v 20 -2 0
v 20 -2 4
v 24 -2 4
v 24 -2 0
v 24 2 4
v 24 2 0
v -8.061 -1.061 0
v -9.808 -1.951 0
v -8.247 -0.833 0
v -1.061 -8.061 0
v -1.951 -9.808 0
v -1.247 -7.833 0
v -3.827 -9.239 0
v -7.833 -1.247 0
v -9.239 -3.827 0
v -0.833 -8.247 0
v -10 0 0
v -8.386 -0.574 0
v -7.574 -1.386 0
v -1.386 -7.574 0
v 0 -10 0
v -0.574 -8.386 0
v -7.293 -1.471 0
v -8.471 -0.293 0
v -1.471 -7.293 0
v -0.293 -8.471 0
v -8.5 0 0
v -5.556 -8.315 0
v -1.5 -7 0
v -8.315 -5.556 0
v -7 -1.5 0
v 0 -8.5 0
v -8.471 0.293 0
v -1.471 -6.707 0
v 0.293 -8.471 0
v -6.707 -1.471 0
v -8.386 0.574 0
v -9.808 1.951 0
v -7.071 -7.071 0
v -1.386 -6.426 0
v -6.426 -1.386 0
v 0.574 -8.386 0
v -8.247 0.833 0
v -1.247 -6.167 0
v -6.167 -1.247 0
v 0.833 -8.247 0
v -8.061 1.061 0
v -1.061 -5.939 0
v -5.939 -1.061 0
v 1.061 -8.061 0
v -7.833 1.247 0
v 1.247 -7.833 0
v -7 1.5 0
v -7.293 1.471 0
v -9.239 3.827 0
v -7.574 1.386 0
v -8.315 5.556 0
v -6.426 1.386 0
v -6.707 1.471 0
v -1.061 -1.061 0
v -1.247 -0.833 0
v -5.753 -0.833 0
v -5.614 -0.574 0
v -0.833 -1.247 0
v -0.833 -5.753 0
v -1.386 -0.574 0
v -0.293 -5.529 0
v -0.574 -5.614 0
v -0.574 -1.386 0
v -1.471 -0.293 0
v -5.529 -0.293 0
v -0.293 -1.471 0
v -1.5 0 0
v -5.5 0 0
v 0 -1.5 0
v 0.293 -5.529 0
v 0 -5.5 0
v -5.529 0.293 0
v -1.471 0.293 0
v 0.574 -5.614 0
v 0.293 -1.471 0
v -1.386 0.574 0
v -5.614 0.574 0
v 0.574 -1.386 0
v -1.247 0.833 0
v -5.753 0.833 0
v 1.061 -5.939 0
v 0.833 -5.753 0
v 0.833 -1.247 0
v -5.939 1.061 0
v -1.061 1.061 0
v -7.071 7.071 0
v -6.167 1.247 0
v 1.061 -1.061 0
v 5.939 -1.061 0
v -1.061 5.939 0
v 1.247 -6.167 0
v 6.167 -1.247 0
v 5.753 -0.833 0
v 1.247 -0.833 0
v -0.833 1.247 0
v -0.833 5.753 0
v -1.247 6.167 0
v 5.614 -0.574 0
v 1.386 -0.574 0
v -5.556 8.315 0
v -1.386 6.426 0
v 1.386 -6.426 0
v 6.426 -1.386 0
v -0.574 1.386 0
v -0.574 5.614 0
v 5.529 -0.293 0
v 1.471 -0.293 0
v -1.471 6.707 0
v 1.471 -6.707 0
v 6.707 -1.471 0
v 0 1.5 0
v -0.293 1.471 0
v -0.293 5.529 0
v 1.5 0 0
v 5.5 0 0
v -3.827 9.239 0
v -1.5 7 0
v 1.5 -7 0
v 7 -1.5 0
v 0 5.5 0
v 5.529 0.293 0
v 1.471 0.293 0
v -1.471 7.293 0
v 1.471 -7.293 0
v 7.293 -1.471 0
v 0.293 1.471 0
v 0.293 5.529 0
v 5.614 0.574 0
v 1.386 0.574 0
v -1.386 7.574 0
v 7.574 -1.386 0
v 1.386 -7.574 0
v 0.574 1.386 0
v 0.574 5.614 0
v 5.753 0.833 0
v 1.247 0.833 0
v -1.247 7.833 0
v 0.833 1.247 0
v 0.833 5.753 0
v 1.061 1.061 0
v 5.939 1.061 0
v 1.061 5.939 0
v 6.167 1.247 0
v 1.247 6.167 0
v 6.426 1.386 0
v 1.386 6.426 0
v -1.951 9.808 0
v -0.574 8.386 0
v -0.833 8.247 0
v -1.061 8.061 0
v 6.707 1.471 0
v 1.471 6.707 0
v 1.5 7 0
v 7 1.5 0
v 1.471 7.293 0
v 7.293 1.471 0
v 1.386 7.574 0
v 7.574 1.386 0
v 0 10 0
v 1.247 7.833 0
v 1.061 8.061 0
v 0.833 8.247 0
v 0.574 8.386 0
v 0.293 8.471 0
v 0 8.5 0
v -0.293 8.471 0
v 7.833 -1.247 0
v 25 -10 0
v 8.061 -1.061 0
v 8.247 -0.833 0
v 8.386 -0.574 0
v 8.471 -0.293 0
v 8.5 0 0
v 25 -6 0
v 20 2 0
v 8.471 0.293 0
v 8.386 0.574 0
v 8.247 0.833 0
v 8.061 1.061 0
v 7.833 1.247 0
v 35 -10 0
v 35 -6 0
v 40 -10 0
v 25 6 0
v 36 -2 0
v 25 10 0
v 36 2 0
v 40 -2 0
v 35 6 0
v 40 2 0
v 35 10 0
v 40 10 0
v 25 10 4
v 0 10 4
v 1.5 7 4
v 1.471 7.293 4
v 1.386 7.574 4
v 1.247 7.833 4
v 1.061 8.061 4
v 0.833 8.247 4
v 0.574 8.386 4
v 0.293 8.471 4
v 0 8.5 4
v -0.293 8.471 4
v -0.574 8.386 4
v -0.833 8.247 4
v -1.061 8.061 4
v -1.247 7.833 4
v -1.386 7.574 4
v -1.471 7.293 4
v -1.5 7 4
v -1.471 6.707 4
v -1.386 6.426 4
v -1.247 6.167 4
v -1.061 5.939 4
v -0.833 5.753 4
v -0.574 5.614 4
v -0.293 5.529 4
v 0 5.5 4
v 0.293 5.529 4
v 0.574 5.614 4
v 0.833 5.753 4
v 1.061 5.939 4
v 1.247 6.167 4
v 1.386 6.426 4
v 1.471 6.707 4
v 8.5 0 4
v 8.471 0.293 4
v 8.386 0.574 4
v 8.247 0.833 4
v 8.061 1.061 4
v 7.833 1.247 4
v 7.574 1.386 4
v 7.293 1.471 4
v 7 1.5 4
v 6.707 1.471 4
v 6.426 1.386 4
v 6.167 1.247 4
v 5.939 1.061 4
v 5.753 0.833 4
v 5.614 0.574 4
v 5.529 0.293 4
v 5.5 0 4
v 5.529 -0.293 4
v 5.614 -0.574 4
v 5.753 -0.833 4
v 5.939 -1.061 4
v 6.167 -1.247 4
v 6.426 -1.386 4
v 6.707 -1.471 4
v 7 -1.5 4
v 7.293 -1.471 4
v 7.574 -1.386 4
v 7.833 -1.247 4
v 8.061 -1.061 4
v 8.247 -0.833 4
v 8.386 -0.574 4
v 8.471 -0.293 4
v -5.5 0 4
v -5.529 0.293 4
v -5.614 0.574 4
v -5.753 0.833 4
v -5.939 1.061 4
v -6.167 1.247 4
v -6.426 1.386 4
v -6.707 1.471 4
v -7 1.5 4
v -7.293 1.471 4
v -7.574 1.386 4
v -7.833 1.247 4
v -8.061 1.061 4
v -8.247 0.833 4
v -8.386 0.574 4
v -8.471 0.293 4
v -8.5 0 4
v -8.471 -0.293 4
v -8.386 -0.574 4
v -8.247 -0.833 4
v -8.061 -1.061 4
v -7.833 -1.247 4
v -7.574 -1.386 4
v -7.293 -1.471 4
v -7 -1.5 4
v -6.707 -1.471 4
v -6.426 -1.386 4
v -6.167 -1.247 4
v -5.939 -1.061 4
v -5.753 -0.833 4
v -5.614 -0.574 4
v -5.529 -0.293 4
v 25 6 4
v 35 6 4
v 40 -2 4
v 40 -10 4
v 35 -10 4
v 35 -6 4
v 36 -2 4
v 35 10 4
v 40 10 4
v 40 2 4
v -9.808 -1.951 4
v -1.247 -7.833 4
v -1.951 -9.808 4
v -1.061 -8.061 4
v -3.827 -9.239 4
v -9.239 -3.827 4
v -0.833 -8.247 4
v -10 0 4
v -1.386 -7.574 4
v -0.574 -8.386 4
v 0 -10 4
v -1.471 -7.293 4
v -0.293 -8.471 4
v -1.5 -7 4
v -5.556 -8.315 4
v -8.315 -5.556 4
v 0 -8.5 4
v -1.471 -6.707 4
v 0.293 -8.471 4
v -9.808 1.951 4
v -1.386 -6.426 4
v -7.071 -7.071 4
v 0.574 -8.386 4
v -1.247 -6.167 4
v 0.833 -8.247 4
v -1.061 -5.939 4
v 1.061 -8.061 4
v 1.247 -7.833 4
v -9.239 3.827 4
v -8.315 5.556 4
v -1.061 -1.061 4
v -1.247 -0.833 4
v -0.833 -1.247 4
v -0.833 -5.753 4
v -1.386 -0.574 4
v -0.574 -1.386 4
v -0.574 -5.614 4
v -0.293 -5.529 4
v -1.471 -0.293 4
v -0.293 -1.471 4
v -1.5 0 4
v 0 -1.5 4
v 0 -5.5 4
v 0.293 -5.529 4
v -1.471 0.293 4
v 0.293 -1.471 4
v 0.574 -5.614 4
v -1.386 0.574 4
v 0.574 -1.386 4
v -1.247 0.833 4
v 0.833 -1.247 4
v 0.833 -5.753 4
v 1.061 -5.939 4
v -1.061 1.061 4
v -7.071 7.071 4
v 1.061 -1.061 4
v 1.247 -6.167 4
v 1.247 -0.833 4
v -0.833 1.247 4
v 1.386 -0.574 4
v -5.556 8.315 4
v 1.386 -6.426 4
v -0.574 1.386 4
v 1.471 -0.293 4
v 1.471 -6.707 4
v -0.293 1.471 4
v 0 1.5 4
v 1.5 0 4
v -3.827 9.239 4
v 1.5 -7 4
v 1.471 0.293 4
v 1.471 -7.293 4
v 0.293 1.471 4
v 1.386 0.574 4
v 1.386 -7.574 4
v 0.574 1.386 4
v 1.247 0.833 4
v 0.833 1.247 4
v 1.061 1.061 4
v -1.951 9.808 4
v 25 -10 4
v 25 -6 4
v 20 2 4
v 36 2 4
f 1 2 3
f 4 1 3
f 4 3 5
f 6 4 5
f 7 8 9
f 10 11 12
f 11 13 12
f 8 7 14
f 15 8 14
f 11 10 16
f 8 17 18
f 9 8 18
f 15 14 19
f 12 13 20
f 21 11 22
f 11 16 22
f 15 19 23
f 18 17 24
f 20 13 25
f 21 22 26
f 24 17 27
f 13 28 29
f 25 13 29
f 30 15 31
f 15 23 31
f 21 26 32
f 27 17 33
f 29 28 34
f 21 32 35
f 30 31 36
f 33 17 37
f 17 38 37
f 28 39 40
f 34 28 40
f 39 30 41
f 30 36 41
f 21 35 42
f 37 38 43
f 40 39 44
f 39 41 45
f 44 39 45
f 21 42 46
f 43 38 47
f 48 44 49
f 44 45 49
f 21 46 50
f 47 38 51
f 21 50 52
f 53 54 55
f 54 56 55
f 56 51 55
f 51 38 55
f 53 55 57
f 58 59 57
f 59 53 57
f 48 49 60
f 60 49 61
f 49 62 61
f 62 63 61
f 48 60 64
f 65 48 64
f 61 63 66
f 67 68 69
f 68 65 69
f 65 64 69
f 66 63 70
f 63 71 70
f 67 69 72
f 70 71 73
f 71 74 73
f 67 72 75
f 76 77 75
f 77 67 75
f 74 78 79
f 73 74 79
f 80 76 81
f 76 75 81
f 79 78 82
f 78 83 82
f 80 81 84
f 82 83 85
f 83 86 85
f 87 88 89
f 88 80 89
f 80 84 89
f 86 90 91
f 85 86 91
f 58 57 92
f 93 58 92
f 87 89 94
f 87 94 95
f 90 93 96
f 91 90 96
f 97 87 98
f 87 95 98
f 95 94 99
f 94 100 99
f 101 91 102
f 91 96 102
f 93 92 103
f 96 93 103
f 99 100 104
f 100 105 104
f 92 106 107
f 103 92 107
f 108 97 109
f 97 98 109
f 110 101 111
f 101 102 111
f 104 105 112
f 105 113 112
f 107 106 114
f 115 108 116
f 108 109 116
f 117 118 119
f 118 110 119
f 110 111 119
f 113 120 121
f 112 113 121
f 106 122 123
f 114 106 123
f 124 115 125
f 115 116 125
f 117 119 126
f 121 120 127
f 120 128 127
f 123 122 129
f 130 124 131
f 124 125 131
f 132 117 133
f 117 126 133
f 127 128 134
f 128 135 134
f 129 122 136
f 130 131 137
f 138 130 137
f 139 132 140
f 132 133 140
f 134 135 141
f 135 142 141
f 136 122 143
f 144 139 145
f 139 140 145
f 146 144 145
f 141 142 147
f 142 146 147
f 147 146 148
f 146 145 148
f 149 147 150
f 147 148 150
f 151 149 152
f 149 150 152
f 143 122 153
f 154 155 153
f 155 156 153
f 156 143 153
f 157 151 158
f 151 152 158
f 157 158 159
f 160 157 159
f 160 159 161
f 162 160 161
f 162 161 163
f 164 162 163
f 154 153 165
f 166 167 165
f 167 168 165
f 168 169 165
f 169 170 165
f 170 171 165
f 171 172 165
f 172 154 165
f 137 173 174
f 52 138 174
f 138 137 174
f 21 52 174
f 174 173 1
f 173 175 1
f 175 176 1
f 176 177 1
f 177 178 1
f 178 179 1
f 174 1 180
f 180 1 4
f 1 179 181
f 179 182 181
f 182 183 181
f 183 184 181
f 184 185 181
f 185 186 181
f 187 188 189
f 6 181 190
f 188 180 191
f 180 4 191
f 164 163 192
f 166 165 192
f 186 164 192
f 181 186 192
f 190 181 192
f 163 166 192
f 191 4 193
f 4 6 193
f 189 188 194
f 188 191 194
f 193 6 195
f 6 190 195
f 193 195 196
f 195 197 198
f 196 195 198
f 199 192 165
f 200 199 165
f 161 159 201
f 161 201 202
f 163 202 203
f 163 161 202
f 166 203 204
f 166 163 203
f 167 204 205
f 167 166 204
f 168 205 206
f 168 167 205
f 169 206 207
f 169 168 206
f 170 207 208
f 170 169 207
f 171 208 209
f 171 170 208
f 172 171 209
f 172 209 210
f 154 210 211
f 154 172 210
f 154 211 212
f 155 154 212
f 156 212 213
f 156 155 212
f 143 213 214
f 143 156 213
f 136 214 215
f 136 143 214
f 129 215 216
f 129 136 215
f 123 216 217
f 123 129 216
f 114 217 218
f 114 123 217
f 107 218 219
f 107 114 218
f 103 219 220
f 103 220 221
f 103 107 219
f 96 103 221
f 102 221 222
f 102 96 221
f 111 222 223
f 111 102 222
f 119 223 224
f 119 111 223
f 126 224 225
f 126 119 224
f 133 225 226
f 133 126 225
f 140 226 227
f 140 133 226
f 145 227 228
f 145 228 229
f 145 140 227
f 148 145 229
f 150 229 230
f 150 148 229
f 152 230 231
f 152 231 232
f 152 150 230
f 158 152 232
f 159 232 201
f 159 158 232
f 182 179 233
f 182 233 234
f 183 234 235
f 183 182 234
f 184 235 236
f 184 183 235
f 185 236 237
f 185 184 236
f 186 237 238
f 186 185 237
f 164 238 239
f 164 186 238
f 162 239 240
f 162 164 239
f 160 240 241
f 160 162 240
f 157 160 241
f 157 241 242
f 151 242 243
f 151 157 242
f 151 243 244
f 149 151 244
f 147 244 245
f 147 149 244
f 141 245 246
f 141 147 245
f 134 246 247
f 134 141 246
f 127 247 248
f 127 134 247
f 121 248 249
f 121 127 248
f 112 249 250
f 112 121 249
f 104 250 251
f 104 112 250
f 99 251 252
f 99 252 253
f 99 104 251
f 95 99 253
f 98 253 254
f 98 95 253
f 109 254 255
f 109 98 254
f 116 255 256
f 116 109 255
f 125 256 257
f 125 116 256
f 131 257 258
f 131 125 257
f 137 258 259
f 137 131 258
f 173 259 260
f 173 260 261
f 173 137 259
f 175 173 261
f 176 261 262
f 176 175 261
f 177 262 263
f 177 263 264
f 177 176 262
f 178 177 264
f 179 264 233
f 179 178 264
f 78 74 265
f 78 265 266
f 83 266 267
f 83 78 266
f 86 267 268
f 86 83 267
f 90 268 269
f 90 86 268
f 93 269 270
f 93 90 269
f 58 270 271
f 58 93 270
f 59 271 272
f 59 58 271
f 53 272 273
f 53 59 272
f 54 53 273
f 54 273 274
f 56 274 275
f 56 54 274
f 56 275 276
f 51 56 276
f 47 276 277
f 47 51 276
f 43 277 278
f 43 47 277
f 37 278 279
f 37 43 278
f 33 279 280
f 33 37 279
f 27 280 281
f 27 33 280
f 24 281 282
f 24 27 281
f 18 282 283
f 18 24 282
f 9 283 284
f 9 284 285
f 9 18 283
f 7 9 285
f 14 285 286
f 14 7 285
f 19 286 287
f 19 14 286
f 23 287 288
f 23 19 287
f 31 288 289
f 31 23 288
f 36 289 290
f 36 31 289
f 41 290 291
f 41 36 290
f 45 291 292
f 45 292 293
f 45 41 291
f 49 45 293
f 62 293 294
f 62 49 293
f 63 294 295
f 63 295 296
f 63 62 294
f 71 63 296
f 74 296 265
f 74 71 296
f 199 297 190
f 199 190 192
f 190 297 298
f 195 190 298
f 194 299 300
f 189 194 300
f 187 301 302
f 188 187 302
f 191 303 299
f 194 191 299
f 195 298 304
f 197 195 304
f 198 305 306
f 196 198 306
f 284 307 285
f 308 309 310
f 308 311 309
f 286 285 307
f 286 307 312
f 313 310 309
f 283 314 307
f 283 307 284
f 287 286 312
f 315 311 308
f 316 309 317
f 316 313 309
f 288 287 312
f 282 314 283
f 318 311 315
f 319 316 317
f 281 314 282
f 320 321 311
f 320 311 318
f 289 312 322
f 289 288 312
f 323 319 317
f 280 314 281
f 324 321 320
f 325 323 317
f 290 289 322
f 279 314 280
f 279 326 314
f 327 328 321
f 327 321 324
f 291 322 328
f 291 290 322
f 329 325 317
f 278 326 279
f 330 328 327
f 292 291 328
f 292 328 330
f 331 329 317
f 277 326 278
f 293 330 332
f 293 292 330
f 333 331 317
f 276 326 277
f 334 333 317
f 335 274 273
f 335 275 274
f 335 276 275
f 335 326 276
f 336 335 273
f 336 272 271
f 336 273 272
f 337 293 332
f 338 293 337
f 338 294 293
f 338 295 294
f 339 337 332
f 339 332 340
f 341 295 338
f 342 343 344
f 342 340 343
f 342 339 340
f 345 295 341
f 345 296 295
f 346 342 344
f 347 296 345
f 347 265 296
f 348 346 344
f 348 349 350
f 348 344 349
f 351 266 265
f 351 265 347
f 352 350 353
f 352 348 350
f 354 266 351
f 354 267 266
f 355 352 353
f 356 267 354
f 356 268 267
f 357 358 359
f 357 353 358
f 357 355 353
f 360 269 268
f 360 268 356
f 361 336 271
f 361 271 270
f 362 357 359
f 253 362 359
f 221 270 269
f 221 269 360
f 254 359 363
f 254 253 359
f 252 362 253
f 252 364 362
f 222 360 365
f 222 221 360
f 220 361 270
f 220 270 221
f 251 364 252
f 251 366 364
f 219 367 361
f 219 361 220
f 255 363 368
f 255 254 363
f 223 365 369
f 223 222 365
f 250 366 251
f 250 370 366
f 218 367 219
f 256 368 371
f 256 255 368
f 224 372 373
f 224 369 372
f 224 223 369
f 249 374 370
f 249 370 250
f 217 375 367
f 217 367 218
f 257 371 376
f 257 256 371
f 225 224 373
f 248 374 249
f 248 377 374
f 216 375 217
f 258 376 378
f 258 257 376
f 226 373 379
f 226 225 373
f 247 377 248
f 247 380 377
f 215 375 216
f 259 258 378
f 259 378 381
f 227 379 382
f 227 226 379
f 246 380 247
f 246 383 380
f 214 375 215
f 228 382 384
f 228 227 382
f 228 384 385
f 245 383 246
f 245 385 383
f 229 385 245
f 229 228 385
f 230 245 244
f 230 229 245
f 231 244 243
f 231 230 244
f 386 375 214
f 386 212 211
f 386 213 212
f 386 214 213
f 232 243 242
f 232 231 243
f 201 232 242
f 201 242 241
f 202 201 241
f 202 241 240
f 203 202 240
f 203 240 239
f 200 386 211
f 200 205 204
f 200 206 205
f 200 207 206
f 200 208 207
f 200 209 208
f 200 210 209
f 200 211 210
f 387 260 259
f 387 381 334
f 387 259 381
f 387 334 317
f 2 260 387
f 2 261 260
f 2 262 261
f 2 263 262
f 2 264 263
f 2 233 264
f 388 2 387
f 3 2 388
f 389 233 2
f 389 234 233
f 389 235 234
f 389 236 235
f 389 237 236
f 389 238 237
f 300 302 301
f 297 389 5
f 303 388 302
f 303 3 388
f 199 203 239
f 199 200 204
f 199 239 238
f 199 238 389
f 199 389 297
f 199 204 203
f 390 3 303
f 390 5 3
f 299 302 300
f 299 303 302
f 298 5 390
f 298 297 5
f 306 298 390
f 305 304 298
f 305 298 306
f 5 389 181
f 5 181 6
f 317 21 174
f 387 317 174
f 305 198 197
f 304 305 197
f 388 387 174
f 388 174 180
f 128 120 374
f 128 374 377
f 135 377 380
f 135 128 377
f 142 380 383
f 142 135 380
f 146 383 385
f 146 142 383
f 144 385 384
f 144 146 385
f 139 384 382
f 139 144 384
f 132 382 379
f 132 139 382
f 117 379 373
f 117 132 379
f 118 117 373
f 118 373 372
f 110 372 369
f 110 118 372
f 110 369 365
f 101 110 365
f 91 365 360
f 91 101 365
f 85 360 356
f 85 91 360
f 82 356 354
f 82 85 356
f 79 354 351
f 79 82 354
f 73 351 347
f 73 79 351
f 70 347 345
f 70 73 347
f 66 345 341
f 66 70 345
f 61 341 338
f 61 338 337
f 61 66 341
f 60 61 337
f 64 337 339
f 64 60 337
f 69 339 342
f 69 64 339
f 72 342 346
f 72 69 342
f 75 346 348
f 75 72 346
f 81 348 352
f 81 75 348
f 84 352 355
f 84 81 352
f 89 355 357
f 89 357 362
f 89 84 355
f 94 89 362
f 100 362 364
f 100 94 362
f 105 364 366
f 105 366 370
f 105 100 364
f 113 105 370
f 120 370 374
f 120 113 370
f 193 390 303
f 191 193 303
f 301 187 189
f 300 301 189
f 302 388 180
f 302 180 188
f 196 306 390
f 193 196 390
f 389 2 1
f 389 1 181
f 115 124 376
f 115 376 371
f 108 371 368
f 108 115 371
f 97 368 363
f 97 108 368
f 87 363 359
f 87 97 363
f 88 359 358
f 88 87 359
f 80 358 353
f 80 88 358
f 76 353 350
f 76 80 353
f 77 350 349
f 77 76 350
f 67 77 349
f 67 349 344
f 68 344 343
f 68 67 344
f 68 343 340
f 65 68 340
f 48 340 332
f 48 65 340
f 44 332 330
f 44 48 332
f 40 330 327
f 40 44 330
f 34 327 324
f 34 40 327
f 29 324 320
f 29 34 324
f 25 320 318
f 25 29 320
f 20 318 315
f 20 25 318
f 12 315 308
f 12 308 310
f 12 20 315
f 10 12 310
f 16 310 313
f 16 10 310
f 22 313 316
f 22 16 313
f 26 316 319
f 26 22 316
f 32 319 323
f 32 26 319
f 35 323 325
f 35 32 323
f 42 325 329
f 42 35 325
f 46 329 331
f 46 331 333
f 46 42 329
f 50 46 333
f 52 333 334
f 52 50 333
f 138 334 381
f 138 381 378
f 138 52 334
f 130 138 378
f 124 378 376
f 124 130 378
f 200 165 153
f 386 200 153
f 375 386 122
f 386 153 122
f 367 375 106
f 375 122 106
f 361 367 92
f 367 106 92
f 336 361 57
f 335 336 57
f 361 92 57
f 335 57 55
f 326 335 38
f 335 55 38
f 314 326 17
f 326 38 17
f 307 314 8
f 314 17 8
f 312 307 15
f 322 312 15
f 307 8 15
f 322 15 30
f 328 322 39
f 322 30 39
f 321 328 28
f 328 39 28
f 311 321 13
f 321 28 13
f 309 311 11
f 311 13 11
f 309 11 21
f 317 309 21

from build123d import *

# Parameters (mm, degrees)
SKETCH_1_R          = 1
SKETCH_1_R_2        = 1.5
EXTRUDE_1_DEPTH     = 4
SKETCH_2_W          = 10
SKETCH_2_H          = 4
SKETCH_2_W_2        = 4
CUT_EXTRUDE_3_DEPTH = 10


with BuildPart() as part:
    # Эскиз1 → Бобышка-Вытянуть1 (new body)
    with BuildSketch(Plane.XY):
        with BuildLine():
            Line((47, -12.5), (55, -12.5))
            Line((55, -12.5), (55, 12.5))
            Line((55, 12.5), (47, 12.5))
            Line((47, 12.5), (47, 10))
            Line((47, 10), (0, 10))
            ThreePointArc((0, 10), (-10, 0), (0, -10))
            Line((0, -10), (47, -10))
            Line((47, -10), (47, -12.5))
        make_face()
        with Locations((49, 10.5)):
            Circle(SKETCH_1_R, mode=Mode.SUBTRACT)
        with Locations(Location((49, -10.5, 0), (0, 0, 180))):
            Circle(SKETCH_1_R, mode=Mode.SUBTRACT)
        Circle(SKETCH_1_R_2, mode=Mode.SUBTRACT)
        with Locations((0, 7)):
            Circle(SKETCH_1_R_2, mode=Mode.SUBTRACT)
        with Locations((7, 0)):
            Circle(SKETCH_1_R_2, mode=Mode.SUBTRACT)
        with Locations((0, -7)):
            Circle(SKETCH_1_R_2, mode=Mode.SUBTRACT)
        with Locations((-7, 0)):
            Circle(SKETCH_1_R_2, mode=Mode.SUBTRACT)
    extrude(amount=EXTRUDE_1_DEPTH)

    # Эскиз2 → Вырез-Вытянуть3 (cut)
    with BuildSketch(Plane.XY.offset(4)):
        with Locations((30, 8)):
            Rectangle(SKETCH_2_W, SKETCH_2_H)
        with Locations((30, -8)):
            Rectangle(SKETCH_2_W, SKETCH_2_H)
        with Locations((22, 0)):
            Rectangle(SKETCH_2_W_2, SKETCH_2_H)
        Polygon((36, -2), (40, -2), (40, -18.487947924), (59.066234822, -18.487947924), (59.066234822, 17.495643995), (40, 17.495643995), (40, 2), (36, 2), align=None)
    extrude(amount=-CUT_EXTRUDE_3_DEPTH, mode=Mode.SUBTRACT)


solid = part.part
